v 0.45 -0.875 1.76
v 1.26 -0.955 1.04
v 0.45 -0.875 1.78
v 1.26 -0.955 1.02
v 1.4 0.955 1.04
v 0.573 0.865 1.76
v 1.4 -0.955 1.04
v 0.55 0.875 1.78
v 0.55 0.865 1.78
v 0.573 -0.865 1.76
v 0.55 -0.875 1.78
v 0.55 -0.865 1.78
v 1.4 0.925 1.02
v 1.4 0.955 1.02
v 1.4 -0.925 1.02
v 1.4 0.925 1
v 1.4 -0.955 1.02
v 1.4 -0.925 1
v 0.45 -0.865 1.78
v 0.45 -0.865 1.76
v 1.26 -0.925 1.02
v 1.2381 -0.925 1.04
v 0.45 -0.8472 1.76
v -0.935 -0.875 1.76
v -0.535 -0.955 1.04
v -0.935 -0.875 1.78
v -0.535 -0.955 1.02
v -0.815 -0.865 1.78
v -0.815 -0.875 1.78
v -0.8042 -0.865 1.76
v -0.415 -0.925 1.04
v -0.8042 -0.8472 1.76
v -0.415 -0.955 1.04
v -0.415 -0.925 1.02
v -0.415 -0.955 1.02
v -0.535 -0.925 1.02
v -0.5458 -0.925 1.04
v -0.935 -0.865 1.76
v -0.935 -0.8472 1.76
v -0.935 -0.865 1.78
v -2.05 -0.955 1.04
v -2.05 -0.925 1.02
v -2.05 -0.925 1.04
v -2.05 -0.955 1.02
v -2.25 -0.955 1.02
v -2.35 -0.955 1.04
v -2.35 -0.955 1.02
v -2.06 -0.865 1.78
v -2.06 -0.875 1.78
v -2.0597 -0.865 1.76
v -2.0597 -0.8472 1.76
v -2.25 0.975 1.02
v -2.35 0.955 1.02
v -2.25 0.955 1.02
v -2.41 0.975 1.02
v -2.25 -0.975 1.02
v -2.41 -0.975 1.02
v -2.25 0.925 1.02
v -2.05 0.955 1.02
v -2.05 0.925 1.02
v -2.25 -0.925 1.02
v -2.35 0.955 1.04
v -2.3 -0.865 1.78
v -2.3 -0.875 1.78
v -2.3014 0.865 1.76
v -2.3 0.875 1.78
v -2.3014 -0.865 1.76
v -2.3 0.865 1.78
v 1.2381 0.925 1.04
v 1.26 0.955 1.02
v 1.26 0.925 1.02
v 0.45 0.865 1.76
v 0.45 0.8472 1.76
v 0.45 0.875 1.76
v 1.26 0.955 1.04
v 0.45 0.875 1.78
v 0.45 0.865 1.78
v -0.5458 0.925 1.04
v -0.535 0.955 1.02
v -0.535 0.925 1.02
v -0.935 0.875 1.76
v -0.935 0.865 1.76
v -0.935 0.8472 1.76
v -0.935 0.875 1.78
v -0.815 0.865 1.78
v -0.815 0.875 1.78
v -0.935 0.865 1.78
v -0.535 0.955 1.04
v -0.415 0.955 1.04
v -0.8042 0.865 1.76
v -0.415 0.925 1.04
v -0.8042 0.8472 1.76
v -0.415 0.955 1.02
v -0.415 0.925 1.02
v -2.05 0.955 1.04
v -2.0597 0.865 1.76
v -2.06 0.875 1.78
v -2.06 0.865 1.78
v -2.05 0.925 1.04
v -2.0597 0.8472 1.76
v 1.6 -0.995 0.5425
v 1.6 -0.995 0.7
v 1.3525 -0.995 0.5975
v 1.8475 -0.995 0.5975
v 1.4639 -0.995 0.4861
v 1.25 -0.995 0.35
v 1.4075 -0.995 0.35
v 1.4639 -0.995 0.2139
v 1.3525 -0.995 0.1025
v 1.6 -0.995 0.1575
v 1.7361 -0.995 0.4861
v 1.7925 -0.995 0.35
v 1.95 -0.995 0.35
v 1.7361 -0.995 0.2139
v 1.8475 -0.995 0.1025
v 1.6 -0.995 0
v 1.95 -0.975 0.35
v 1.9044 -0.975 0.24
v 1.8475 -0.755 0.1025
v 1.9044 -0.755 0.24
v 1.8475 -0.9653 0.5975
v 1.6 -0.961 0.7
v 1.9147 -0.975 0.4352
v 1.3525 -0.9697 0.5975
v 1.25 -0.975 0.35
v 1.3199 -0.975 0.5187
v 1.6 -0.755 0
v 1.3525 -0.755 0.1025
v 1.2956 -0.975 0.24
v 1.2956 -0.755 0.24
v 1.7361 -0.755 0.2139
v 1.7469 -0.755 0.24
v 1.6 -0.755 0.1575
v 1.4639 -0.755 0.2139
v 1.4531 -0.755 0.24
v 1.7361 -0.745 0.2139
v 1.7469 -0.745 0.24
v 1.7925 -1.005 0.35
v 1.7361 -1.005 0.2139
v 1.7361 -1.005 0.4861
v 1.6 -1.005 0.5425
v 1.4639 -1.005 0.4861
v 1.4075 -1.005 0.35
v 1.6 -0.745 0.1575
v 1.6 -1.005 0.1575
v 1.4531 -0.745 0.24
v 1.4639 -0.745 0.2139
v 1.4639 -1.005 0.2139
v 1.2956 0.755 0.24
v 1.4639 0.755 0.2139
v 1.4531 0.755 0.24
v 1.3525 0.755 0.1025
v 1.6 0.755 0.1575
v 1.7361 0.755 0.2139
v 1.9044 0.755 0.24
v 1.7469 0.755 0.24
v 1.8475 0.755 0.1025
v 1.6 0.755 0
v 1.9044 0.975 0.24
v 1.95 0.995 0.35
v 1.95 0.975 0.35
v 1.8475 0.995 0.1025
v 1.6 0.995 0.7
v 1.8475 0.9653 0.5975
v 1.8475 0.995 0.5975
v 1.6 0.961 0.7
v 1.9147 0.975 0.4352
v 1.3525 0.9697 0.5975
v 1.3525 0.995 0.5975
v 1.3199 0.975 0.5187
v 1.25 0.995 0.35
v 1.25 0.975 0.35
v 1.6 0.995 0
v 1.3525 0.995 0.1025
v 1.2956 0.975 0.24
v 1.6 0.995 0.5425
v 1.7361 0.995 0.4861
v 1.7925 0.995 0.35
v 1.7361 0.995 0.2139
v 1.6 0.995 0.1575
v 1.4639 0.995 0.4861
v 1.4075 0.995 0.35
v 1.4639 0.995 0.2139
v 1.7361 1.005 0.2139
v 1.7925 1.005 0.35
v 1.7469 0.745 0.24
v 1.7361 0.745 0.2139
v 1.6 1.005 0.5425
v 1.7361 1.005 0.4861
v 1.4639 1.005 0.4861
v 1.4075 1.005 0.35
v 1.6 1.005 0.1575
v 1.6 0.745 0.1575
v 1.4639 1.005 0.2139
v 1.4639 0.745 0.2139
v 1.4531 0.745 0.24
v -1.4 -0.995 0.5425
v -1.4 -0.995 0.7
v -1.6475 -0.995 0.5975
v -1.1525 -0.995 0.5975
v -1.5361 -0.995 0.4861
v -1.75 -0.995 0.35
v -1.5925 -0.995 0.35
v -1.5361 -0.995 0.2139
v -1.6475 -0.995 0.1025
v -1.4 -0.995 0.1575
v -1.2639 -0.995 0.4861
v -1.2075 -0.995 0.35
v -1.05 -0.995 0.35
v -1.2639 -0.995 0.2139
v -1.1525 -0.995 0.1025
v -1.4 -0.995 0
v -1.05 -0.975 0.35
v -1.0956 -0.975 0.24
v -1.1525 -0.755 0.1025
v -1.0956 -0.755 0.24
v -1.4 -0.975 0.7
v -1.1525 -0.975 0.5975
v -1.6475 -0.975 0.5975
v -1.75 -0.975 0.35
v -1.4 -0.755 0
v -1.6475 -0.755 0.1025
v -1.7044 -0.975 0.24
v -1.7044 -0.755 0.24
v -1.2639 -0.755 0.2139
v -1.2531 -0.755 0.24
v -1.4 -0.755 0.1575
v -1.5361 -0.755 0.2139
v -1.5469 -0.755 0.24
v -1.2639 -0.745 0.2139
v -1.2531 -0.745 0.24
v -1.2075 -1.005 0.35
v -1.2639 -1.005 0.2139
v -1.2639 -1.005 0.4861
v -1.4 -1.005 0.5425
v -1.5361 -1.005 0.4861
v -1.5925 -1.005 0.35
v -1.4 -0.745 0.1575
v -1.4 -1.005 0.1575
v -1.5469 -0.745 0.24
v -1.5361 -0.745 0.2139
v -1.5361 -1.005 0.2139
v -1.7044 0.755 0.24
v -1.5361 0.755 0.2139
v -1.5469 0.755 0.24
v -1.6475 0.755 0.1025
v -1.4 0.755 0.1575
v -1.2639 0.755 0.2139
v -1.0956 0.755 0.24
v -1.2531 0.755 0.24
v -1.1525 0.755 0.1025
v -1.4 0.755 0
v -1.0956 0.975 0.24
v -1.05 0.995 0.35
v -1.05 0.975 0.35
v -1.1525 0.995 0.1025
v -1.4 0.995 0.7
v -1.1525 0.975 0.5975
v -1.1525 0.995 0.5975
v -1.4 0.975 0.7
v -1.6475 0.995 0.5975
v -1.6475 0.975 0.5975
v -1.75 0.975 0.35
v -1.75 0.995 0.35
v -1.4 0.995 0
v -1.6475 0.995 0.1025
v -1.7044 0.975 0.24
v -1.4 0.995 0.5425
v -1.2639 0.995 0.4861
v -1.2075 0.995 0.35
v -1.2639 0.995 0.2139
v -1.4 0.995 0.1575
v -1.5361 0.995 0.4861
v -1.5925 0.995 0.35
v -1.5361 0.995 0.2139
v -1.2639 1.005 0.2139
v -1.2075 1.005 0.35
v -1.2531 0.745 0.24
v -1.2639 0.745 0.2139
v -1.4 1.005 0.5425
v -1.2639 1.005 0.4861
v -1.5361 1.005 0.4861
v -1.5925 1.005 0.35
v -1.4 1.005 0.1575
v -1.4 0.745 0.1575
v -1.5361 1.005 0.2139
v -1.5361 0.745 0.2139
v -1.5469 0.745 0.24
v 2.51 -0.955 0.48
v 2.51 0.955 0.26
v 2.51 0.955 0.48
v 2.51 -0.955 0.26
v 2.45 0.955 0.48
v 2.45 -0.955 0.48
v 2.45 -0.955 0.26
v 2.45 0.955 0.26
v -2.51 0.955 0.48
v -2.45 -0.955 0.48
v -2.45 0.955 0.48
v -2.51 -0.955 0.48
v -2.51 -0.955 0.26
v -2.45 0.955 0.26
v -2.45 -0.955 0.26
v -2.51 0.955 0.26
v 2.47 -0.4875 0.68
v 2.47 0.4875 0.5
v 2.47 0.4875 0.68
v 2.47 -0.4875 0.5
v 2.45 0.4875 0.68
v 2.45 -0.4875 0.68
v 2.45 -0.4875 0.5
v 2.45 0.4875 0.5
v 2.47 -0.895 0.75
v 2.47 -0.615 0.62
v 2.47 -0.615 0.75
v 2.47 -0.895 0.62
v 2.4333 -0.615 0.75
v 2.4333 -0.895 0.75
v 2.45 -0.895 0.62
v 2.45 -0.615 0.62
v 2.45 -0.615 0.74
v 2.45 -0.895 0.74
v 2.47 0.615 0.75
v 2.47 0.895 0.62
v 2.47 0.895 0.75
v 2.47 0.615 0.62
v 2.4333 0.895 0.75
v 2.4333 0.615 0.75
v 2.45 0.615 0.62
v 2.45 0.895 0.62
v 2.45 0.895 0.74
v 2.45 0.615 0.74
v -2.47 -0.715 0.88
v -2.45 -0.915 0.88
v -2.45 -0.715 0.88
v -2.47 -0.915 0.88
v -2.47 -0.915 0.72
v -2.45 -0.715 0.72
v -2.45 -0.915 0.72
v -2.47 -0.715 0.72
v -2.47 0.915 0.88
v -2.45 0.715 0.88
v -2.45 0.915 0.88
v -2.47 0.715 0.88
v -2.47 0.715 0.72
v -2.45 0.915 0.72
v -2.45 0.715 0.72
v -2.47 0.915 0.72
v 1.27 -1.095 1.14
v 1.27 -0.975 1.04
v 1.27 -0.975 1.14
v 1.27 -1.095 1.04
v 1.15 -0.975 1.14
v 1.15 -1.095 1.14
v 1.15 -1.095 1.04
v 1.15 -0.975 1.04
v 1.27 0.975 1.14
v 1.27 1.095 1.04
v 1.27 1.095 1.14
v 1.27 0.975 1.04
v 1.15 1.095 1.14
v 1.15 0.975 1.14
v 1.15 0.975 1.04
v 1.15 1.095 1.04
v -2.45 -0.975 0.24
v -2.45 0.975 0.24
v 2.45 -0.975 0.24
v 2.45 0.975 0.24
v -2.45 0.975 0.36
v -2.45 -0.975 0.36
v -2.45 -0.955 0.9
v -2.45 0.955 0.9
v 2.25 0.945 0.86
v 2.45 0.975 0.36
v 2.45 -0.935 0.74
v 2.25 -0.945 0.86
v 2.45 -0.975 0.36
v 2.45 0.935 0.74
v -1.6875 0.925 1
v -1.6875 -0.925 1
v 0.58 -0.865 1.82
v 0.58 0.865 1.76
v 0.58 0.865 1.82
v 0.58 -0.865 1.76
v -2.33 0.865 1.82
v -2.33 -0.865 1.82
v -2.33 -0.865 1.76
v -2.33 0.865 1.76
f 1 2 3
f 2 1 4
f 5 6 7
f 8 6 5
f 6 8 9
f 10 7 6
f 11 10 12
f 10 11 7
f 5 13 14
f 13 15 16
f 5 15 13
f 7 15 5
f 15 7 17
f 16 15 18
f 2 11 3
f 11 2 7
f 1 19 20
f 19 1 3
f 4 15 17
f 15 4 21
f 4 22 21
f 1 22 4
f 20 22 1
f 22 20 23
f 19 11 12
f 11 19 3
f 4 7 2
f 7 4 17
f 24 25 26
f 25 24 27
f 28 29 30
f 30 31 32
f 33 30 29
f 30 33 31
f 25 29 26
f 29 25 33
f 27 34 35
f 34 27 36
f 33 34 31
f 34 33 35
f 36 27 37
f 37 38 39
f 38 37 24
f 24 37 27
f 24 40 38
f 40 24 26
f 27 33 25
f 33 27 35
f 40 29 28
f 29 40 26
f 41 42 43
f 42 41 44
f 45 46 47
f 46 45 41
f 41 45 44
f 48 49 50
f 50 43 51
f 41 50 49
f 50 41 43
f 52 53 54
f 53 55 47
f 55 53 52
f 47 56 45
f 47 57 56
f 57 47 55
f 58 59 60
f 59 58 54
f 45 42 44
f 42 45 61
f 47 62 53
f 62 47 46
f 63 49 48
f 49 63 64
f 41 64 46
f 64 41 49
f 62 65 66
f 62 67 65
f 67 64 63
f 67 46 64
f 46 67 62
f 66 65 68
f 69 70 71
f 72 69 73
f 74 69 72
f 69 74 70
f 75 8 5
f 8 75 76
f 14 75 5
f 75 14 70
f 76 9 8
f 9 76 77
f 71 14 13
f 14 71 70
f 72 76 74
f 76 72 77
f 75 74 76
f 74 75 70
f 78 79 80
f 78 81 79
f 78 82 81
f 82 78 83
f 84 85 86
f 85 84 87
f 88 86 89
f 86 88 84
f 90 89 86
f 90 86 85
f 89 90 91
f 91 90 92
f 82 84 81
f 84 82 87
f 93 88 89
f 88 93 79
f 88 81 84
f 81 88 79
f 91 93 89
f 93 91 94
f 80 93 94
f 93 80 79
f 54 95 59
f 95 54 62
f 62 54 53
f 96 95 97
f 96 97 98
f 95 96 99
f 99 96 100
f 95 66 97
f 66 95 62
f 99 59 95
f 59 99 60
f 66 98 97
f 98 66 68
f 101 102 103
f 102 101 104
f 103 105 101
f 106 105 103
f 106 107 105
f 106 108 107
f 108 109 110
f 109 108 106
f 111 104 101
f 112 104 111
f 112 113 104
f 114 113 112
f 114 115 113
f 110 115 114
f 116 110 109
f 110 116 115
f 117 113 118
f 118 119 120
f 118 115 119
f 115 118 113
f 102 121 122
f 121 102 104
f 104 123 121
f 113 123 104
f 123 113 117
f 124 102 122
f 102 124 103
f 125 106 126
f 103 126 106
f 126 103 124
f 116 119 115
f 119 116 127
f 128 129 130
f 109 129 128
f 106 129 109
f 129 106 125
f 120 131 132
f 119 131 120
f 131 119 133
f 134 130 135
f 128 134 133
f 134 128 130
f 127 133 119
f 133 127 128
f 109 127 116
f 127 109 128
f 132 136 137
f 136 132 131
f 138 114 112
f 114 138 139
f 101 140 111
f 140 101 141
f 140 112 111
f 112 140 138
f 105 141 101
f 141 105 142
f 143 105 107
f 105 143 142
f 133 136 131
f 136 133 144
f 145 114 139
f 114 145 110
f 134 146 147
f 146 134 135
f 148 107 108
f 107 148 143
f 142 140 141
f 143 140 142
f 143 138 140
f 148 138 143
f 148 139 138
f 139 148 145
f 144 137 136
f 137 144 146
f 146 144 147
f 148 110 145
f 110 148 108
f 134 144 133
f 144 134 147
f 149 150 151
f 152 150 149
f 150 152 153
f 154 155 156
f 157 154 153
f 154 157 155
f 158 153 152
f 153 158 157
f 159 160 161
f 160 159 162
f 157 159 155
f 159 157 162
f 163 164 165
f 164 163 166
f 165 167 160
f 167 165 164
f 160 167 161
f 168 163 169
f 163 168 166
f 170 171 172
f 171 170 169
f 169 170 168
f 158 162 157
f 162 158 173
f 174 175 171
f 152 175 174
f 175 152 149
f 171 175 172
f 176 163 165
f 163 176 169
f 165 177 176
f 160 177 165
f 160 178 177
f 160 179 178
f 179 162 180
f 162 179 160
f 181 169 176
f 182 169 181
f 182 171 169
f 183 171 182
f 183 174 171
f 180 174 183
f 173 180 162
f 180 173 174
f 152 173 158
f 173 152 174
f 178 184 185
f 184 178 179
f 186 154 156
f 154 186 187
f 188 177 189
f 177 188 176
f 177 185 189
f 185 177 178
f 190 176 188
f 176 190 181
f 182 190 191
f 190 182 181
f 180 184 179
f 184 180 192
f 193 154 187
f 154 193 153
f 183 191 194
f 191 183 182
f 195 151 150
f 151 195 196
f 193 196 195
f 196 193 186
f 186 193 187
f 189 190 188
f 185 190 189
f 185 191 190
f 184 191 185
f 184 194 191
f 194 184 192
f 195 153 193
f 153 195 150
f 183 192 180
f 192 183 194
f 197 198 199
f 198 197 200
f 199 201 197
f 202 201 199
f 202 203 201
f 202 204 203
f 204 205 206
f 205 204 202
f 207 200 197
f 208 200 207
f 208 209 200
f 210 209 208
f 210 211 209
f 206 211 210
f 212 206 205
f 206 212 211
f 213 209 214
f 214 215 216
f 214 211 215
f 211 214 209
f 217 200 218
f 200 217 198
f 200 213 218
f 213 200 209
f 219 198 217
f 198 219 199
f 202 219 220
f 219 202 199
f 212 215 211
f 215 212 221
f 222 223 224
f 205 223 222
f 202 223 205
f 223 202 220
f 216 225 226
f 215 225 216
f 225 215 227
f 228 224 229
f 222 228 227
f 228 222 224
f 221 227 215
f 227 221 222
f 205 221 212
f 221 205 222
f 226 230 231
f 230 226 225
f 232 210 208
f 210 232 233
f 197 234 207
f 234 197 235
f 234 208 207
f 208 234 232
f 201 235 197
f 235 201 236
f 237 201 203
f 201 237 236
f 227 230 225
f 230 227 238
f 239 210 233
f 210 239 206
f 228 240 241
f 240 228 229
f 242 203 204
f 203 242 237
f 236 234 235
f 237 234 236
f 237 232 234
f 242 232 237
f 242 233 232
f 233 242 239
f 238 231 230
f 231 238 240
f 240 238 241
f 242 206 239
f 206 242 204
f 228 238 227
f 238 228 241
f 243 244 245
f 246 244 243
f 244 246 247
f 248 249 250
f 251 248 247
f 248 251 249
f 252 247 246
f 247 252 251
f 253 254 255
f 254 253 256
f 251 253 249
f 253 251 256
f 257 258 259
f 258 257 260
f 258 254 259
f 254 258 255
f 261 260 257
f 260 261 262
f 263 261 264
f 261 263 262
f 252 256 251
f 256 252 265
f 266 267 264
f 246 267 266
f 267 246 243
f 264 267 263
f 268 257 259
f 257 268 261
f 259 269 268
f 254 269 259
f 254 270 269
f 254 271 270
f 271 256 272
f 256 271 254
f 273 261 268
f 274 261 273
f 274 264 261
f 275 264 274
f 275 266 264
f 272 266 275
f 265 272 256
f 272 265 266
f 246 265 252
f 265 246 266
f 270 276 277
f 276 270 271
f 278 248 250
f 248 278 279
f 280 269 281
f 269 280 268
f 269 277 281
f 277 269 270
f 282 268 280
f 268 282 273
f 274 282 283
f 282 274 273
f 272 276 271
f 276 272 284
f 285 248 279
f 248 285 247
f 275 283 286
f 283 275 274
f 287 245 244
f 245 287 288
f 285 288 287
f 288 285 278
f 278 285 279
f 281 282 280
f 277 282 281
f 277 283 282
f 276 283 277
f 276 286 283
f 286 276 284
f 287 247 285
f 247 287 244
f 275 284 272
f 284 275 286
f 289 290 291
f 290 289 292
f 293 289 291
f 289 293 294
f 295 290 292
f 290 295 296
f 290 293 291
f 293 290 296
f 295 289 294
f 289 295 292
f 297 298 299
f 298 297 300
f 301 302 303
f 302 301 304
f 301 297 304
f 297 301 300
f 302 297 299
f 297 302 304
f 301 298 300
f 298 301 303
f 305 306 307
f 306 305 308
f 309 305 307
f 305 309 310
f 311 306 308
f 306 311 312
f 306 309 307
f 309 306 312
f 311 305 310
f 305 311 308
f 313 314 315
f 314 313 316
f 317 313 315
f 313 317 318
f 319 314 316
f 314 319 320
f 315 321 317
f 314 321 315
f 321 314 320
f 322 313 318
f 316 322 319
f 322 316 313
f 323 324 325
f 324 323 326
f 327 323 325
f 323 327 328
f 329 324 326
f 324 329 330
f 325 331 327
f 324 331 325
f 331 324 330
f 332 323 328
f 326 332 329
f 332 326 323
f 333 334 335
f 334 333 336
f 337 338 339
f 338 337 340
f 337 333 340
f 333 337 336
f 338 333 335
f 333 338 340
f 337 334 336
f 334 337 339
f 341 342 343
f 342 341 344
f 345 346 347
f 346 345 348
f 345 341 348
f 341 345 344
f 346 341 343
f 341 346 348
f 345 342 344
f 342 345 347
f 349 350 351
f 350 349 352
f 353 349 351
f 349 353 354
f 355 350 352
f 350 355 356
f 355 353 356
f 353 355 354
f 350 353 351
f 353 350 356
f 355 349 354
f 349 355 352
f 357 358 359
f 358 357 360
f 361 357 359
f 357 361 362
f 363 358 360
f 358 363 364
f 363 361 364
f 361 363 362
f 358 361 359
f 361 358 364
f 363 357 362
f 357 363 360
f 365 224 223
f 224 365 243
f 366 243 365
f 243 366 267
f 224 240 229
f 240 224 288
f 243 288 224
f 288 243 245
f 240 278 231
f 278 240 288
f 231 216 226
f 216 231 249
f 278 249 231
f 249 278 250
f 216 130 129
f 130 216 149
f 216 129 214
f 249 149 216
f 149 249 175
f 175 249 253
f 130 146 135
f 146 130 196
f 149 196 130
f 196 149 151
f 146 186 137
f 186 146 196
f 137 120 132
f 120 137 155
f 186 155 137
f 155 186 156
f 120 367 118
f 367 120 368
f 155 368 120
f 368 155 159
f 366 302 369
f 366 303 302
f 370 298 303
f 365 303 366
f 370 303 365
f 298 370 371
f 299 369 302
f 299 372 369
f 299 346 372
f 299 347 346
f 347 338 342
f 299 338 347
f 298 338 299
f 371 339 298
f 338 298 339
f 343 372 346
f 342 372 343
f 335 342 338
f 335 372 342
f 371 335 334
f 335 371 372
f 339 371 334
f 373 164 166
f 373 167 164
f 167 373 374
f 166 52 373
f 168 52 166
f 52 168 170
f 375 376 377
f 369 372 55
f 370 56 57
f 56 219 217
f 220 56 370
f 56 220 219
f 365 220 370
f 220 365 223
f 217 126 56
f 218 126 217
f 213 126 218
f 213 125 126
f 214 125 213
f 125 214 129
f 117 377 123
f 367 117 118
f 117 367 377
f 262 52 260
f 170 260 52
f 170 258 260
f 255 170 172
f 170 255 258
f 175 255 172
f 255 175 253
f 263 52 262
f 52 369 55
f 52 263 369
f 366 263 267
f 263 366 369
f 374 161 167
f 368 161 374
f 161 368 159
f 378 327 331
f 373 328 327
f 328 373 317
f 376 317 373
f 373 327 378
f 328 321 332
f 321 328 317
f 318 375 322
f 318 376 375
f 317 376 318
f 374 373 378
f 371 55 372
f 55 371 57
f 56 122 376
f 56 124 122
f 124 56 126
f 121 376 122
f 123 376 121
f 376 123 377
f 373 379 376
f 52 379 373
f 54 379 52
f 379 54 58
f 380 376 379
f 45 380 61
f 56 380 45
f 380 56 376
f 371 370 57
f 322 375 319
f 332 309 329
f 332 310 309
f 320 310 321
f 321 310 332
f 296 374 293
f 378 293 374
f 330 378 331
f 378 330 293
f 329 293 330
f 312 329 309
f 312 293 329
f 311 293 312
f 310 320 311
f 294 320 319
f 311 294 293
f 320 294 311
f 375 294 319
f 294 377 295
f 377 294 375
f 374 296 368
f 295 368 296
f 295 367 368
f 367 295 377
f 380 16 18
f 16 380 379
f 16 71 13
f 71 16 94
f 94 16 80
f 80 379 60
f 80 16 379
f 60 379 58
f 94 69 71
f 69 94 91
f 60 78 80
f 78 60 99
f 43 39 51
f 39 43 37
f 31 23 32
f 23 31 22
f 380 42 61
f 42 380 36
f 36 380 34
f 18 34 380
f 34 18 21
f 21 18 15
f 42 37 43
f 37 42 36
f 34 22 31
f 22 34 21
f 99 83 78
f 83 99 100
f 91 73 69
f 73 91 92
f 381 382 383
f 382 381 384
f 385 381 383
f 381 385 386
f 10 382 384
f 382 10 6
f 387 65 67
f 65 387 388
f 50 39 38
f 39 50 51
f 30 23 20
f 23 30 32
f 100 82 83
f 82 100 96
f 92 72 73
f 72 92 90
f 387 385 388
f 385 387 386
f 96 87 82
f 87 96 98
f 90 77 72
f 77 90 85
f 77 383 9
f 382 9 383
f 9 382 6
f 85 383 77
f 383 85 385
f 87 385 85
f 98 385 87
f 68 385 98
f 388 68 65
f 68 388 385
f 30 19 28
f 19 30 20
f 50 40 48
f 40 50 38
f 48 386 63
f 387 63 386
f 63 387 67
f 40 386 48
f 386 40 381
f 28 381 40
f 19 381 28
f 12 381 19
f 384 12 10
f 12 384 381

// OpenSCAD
// file: lib/car_kit.scad
// Car kit — the parts every road vehicle shares (car_sedan.scad,
// car_minisuv.scad, car_suv.scad, car_jeep.scad, car_van.scad), which
// differ in their proportions. world.CarKind names them; the renderer
// draws each kind from its own mesh, tinted per car, with a roof rack or
// box (car_roof_rack.scad, car_roof_box.scad) set on the roof at the
// height in render.carRoofs.
//
//   +X = forward (the car's front faces +X)
//   +Y = lateral (driver's left when facing +X)
//   +Z = up
//
// The paint is near white so the per-car tint is the paint colour;
// glass, tyres, trim and lights are dark or bright enough to read
// through any tint.
//
// Conventions, units, and axis docs: see models-src/README.md.

$fn = 8;

paint  = [0.92, 0.92, 0.92];
glass  = [0.30, 0.40, 0.50];
trim   = [0.16, 0.16, 0.17]; // bumpers, grille, rails, mirrors
tyre   = [0.08, 0.08, 0.08];
hubcap = [0.55, 0.56, 0.58];
lamp   = [1.00, 0.96, 0.82];
tail   = [0.80, 0.12, 0.10];

// slab is a thin box from x0 to x1, centred in Y, its top at z.
module slab(x0, x1, w, z, t = 0.04) {
    translate([x0, -w / 2, z - t]) cube([x1 - x0, w, t]);
}

module wheel(x, y, r, t) {
    translate([x, y, r]) rotate([90, 0, 0]) {
        color(tyre) cylinder(h = t, r = r, center = true);
        color(hubcap) cylinder(h = t + 0.02, r = r * 0.55, center = true);
    }
}

// vehicle draws one car.
//   len, w        overall body length and width
//   r, wb         wheel radius and wheelbase (axles centred on x = axle_x)
//   sill          height of the body's underside
//   belt          the beltline: top of the doors, bottom of the glass
//   hood          top of the hood at the nose (below belt slopes it)
//   nose, tailin  how far the top of the body is drawn in from the
//                 front and back ends (rounding them)
//   roof          roof height
//   gb            [x0, x1] the glass at the beltline
//   gr            [x0, x1] the glass at the roof
//   rails         roof rails (SUVs)
module vehicle(len, w, r, wb, sill, belt, hood, nose, tailin, roof, gb, gr,
               axle_x = 0, rails = false) {
    // Body: a hull from the full-length underside to the beltline at the
    // back and the hood at the nose.
    color(paint) hull() {
        slab(-len / 2, len / 2, w, sill + 0.12, 0.12);
        slab(-len / 2 + tailin, gb[0] + 0.1, w, belt);
        slab(gb[1] - 0.1, len / 2 - nose, w - 0.06, hood);
        slab(-len / 2, -len / 2 + 0.05, w - 0.04, belt - 0.12);
        slab(len / 2 - 0.05, len / 2, w - 0.08, hood - 0.12);
    }
    // Glass greenhouse, and the painted roof on it.
    color(glass) hull() {
        slab(gb[0], gb[1], w - 0.10, belt + 0.02, 0.04);
        slab(gr[0], gr[1], w - 0.26, roof - 0.04, 0.04);
    }
    color(paint) slab(gr[0] - 0.03, gr[1] + 0.03, w - 0.22, roof, 0.06);
    // Pillars down the sides of the glass: the windshield's (A), between
    // the doors (B), and a broad one at the back (C).
    color(paint) for (s = [-1, 1]) {
        pillar(gb[1] - 0.14, gb[1], gr[1] - 0.10, gr[1], s);
        pillar((gb[0] + gb[1]) / 2 - 0.06, (gb[0] + gb[1]) / 2 + 0.06,
               (gr[0] + gr[1]) / 2 - 0.06, (gr[0] + gr[1]) / 2 + 0.06, s);
        pillar(gb[0], gb[0] + 0.30, gr[0], gr[0] + 0.24, s);
    }
    module pillar(b0, b1, r0, r1, s) hull() {
        translate([b0, s * (w - 0.10) / 2 - 0.03, belt]) cube([b1 - b0, 0.06, 0.02]);
        translate([r0, s * (w - 0.26) / 2 - 0.03, roof - 0.06]) cube([r1 - r0, 0.06, 0.02]);
    }
    if (rails)
        color(trim) for (s = [-1, 1])
            translate([gr[0] + 0.05, s * (w / 2 - 0.2) - 0.03, roof])
                cube([gr[1] - gr[0] - 0.1, 0.06, 0.06]);

    // Wheels, flush with the body sides.
    t = 0.24;
    for (x = [axle_x + wb / 2, axle_x - wb / 2], s = [-1, 1])
        wheel(x, s * (w / 2 - t / 2 + 0.02), r, t);

    // Bumpers, grille, lights.
    bz = sill + 0.02;
    color(trim) {
        translate([len / 2 - 0.08, -w / 2 + 0.02, bz]) cube([0.14, w - 0.04, 0.22]);
        translate([-len / 2 - 0.06, -w / 2 + 0.02, bz]) cube([0.14, w - 0.04, 0.22]);
        translate([len / 2 - 0.03, -w * 0.25, bz + 0.24]) cube([0.05, w * 0.5, max(hood - bz - 0.42, 0.12)]);
    }
    lz = hood - 0.16;
    color(lamp) for (s = [-1, 1])
        translate([len / 2 - 0.04, s * (w / 2 - 0.22) - 0.14, lz - 0.08]) cube([0.06, 0.28, 0.13]);
    color(tail) for (s = [-1, 1])
        translate([-len / 2 - 0.02, s * (w / 2 - 0.16) - 0.10, belt - 0.30]) cube([0.06, 0.20, 0.16]);
    // Mirrors.
    color(trim) for (s = [-1, 1])
        translate([gb[1] - 0.25, s * (w / 2 + 0.06) - 0.06, belt + 0.02]) cube([0.12, 0.12, 0.10]);

    echo("MOGUL_META", "footprint", len / 2, w / 2 + 0.08);
}
// main file
// Van — a minivan: a short sloping nose and one long box of glass.
// Seats seven, so a family or a carload of friends comes in one van
// (sim.vehicleSeats). Parts and conventions: lib/car_kit.scad.
include <lib/car_kit.scad>

vehicle(len = 4.90, w = 1.95, r = 0.35, wb = 3.00, sill = 0.24,
        belt = 1.02, hood = 0.86, nose = 0.20, tailin = 0.04,
        roof = 1.82, gb = [-2.35, 1.40], gr = [-2.30, 0.55], axle_x = 0.10);
